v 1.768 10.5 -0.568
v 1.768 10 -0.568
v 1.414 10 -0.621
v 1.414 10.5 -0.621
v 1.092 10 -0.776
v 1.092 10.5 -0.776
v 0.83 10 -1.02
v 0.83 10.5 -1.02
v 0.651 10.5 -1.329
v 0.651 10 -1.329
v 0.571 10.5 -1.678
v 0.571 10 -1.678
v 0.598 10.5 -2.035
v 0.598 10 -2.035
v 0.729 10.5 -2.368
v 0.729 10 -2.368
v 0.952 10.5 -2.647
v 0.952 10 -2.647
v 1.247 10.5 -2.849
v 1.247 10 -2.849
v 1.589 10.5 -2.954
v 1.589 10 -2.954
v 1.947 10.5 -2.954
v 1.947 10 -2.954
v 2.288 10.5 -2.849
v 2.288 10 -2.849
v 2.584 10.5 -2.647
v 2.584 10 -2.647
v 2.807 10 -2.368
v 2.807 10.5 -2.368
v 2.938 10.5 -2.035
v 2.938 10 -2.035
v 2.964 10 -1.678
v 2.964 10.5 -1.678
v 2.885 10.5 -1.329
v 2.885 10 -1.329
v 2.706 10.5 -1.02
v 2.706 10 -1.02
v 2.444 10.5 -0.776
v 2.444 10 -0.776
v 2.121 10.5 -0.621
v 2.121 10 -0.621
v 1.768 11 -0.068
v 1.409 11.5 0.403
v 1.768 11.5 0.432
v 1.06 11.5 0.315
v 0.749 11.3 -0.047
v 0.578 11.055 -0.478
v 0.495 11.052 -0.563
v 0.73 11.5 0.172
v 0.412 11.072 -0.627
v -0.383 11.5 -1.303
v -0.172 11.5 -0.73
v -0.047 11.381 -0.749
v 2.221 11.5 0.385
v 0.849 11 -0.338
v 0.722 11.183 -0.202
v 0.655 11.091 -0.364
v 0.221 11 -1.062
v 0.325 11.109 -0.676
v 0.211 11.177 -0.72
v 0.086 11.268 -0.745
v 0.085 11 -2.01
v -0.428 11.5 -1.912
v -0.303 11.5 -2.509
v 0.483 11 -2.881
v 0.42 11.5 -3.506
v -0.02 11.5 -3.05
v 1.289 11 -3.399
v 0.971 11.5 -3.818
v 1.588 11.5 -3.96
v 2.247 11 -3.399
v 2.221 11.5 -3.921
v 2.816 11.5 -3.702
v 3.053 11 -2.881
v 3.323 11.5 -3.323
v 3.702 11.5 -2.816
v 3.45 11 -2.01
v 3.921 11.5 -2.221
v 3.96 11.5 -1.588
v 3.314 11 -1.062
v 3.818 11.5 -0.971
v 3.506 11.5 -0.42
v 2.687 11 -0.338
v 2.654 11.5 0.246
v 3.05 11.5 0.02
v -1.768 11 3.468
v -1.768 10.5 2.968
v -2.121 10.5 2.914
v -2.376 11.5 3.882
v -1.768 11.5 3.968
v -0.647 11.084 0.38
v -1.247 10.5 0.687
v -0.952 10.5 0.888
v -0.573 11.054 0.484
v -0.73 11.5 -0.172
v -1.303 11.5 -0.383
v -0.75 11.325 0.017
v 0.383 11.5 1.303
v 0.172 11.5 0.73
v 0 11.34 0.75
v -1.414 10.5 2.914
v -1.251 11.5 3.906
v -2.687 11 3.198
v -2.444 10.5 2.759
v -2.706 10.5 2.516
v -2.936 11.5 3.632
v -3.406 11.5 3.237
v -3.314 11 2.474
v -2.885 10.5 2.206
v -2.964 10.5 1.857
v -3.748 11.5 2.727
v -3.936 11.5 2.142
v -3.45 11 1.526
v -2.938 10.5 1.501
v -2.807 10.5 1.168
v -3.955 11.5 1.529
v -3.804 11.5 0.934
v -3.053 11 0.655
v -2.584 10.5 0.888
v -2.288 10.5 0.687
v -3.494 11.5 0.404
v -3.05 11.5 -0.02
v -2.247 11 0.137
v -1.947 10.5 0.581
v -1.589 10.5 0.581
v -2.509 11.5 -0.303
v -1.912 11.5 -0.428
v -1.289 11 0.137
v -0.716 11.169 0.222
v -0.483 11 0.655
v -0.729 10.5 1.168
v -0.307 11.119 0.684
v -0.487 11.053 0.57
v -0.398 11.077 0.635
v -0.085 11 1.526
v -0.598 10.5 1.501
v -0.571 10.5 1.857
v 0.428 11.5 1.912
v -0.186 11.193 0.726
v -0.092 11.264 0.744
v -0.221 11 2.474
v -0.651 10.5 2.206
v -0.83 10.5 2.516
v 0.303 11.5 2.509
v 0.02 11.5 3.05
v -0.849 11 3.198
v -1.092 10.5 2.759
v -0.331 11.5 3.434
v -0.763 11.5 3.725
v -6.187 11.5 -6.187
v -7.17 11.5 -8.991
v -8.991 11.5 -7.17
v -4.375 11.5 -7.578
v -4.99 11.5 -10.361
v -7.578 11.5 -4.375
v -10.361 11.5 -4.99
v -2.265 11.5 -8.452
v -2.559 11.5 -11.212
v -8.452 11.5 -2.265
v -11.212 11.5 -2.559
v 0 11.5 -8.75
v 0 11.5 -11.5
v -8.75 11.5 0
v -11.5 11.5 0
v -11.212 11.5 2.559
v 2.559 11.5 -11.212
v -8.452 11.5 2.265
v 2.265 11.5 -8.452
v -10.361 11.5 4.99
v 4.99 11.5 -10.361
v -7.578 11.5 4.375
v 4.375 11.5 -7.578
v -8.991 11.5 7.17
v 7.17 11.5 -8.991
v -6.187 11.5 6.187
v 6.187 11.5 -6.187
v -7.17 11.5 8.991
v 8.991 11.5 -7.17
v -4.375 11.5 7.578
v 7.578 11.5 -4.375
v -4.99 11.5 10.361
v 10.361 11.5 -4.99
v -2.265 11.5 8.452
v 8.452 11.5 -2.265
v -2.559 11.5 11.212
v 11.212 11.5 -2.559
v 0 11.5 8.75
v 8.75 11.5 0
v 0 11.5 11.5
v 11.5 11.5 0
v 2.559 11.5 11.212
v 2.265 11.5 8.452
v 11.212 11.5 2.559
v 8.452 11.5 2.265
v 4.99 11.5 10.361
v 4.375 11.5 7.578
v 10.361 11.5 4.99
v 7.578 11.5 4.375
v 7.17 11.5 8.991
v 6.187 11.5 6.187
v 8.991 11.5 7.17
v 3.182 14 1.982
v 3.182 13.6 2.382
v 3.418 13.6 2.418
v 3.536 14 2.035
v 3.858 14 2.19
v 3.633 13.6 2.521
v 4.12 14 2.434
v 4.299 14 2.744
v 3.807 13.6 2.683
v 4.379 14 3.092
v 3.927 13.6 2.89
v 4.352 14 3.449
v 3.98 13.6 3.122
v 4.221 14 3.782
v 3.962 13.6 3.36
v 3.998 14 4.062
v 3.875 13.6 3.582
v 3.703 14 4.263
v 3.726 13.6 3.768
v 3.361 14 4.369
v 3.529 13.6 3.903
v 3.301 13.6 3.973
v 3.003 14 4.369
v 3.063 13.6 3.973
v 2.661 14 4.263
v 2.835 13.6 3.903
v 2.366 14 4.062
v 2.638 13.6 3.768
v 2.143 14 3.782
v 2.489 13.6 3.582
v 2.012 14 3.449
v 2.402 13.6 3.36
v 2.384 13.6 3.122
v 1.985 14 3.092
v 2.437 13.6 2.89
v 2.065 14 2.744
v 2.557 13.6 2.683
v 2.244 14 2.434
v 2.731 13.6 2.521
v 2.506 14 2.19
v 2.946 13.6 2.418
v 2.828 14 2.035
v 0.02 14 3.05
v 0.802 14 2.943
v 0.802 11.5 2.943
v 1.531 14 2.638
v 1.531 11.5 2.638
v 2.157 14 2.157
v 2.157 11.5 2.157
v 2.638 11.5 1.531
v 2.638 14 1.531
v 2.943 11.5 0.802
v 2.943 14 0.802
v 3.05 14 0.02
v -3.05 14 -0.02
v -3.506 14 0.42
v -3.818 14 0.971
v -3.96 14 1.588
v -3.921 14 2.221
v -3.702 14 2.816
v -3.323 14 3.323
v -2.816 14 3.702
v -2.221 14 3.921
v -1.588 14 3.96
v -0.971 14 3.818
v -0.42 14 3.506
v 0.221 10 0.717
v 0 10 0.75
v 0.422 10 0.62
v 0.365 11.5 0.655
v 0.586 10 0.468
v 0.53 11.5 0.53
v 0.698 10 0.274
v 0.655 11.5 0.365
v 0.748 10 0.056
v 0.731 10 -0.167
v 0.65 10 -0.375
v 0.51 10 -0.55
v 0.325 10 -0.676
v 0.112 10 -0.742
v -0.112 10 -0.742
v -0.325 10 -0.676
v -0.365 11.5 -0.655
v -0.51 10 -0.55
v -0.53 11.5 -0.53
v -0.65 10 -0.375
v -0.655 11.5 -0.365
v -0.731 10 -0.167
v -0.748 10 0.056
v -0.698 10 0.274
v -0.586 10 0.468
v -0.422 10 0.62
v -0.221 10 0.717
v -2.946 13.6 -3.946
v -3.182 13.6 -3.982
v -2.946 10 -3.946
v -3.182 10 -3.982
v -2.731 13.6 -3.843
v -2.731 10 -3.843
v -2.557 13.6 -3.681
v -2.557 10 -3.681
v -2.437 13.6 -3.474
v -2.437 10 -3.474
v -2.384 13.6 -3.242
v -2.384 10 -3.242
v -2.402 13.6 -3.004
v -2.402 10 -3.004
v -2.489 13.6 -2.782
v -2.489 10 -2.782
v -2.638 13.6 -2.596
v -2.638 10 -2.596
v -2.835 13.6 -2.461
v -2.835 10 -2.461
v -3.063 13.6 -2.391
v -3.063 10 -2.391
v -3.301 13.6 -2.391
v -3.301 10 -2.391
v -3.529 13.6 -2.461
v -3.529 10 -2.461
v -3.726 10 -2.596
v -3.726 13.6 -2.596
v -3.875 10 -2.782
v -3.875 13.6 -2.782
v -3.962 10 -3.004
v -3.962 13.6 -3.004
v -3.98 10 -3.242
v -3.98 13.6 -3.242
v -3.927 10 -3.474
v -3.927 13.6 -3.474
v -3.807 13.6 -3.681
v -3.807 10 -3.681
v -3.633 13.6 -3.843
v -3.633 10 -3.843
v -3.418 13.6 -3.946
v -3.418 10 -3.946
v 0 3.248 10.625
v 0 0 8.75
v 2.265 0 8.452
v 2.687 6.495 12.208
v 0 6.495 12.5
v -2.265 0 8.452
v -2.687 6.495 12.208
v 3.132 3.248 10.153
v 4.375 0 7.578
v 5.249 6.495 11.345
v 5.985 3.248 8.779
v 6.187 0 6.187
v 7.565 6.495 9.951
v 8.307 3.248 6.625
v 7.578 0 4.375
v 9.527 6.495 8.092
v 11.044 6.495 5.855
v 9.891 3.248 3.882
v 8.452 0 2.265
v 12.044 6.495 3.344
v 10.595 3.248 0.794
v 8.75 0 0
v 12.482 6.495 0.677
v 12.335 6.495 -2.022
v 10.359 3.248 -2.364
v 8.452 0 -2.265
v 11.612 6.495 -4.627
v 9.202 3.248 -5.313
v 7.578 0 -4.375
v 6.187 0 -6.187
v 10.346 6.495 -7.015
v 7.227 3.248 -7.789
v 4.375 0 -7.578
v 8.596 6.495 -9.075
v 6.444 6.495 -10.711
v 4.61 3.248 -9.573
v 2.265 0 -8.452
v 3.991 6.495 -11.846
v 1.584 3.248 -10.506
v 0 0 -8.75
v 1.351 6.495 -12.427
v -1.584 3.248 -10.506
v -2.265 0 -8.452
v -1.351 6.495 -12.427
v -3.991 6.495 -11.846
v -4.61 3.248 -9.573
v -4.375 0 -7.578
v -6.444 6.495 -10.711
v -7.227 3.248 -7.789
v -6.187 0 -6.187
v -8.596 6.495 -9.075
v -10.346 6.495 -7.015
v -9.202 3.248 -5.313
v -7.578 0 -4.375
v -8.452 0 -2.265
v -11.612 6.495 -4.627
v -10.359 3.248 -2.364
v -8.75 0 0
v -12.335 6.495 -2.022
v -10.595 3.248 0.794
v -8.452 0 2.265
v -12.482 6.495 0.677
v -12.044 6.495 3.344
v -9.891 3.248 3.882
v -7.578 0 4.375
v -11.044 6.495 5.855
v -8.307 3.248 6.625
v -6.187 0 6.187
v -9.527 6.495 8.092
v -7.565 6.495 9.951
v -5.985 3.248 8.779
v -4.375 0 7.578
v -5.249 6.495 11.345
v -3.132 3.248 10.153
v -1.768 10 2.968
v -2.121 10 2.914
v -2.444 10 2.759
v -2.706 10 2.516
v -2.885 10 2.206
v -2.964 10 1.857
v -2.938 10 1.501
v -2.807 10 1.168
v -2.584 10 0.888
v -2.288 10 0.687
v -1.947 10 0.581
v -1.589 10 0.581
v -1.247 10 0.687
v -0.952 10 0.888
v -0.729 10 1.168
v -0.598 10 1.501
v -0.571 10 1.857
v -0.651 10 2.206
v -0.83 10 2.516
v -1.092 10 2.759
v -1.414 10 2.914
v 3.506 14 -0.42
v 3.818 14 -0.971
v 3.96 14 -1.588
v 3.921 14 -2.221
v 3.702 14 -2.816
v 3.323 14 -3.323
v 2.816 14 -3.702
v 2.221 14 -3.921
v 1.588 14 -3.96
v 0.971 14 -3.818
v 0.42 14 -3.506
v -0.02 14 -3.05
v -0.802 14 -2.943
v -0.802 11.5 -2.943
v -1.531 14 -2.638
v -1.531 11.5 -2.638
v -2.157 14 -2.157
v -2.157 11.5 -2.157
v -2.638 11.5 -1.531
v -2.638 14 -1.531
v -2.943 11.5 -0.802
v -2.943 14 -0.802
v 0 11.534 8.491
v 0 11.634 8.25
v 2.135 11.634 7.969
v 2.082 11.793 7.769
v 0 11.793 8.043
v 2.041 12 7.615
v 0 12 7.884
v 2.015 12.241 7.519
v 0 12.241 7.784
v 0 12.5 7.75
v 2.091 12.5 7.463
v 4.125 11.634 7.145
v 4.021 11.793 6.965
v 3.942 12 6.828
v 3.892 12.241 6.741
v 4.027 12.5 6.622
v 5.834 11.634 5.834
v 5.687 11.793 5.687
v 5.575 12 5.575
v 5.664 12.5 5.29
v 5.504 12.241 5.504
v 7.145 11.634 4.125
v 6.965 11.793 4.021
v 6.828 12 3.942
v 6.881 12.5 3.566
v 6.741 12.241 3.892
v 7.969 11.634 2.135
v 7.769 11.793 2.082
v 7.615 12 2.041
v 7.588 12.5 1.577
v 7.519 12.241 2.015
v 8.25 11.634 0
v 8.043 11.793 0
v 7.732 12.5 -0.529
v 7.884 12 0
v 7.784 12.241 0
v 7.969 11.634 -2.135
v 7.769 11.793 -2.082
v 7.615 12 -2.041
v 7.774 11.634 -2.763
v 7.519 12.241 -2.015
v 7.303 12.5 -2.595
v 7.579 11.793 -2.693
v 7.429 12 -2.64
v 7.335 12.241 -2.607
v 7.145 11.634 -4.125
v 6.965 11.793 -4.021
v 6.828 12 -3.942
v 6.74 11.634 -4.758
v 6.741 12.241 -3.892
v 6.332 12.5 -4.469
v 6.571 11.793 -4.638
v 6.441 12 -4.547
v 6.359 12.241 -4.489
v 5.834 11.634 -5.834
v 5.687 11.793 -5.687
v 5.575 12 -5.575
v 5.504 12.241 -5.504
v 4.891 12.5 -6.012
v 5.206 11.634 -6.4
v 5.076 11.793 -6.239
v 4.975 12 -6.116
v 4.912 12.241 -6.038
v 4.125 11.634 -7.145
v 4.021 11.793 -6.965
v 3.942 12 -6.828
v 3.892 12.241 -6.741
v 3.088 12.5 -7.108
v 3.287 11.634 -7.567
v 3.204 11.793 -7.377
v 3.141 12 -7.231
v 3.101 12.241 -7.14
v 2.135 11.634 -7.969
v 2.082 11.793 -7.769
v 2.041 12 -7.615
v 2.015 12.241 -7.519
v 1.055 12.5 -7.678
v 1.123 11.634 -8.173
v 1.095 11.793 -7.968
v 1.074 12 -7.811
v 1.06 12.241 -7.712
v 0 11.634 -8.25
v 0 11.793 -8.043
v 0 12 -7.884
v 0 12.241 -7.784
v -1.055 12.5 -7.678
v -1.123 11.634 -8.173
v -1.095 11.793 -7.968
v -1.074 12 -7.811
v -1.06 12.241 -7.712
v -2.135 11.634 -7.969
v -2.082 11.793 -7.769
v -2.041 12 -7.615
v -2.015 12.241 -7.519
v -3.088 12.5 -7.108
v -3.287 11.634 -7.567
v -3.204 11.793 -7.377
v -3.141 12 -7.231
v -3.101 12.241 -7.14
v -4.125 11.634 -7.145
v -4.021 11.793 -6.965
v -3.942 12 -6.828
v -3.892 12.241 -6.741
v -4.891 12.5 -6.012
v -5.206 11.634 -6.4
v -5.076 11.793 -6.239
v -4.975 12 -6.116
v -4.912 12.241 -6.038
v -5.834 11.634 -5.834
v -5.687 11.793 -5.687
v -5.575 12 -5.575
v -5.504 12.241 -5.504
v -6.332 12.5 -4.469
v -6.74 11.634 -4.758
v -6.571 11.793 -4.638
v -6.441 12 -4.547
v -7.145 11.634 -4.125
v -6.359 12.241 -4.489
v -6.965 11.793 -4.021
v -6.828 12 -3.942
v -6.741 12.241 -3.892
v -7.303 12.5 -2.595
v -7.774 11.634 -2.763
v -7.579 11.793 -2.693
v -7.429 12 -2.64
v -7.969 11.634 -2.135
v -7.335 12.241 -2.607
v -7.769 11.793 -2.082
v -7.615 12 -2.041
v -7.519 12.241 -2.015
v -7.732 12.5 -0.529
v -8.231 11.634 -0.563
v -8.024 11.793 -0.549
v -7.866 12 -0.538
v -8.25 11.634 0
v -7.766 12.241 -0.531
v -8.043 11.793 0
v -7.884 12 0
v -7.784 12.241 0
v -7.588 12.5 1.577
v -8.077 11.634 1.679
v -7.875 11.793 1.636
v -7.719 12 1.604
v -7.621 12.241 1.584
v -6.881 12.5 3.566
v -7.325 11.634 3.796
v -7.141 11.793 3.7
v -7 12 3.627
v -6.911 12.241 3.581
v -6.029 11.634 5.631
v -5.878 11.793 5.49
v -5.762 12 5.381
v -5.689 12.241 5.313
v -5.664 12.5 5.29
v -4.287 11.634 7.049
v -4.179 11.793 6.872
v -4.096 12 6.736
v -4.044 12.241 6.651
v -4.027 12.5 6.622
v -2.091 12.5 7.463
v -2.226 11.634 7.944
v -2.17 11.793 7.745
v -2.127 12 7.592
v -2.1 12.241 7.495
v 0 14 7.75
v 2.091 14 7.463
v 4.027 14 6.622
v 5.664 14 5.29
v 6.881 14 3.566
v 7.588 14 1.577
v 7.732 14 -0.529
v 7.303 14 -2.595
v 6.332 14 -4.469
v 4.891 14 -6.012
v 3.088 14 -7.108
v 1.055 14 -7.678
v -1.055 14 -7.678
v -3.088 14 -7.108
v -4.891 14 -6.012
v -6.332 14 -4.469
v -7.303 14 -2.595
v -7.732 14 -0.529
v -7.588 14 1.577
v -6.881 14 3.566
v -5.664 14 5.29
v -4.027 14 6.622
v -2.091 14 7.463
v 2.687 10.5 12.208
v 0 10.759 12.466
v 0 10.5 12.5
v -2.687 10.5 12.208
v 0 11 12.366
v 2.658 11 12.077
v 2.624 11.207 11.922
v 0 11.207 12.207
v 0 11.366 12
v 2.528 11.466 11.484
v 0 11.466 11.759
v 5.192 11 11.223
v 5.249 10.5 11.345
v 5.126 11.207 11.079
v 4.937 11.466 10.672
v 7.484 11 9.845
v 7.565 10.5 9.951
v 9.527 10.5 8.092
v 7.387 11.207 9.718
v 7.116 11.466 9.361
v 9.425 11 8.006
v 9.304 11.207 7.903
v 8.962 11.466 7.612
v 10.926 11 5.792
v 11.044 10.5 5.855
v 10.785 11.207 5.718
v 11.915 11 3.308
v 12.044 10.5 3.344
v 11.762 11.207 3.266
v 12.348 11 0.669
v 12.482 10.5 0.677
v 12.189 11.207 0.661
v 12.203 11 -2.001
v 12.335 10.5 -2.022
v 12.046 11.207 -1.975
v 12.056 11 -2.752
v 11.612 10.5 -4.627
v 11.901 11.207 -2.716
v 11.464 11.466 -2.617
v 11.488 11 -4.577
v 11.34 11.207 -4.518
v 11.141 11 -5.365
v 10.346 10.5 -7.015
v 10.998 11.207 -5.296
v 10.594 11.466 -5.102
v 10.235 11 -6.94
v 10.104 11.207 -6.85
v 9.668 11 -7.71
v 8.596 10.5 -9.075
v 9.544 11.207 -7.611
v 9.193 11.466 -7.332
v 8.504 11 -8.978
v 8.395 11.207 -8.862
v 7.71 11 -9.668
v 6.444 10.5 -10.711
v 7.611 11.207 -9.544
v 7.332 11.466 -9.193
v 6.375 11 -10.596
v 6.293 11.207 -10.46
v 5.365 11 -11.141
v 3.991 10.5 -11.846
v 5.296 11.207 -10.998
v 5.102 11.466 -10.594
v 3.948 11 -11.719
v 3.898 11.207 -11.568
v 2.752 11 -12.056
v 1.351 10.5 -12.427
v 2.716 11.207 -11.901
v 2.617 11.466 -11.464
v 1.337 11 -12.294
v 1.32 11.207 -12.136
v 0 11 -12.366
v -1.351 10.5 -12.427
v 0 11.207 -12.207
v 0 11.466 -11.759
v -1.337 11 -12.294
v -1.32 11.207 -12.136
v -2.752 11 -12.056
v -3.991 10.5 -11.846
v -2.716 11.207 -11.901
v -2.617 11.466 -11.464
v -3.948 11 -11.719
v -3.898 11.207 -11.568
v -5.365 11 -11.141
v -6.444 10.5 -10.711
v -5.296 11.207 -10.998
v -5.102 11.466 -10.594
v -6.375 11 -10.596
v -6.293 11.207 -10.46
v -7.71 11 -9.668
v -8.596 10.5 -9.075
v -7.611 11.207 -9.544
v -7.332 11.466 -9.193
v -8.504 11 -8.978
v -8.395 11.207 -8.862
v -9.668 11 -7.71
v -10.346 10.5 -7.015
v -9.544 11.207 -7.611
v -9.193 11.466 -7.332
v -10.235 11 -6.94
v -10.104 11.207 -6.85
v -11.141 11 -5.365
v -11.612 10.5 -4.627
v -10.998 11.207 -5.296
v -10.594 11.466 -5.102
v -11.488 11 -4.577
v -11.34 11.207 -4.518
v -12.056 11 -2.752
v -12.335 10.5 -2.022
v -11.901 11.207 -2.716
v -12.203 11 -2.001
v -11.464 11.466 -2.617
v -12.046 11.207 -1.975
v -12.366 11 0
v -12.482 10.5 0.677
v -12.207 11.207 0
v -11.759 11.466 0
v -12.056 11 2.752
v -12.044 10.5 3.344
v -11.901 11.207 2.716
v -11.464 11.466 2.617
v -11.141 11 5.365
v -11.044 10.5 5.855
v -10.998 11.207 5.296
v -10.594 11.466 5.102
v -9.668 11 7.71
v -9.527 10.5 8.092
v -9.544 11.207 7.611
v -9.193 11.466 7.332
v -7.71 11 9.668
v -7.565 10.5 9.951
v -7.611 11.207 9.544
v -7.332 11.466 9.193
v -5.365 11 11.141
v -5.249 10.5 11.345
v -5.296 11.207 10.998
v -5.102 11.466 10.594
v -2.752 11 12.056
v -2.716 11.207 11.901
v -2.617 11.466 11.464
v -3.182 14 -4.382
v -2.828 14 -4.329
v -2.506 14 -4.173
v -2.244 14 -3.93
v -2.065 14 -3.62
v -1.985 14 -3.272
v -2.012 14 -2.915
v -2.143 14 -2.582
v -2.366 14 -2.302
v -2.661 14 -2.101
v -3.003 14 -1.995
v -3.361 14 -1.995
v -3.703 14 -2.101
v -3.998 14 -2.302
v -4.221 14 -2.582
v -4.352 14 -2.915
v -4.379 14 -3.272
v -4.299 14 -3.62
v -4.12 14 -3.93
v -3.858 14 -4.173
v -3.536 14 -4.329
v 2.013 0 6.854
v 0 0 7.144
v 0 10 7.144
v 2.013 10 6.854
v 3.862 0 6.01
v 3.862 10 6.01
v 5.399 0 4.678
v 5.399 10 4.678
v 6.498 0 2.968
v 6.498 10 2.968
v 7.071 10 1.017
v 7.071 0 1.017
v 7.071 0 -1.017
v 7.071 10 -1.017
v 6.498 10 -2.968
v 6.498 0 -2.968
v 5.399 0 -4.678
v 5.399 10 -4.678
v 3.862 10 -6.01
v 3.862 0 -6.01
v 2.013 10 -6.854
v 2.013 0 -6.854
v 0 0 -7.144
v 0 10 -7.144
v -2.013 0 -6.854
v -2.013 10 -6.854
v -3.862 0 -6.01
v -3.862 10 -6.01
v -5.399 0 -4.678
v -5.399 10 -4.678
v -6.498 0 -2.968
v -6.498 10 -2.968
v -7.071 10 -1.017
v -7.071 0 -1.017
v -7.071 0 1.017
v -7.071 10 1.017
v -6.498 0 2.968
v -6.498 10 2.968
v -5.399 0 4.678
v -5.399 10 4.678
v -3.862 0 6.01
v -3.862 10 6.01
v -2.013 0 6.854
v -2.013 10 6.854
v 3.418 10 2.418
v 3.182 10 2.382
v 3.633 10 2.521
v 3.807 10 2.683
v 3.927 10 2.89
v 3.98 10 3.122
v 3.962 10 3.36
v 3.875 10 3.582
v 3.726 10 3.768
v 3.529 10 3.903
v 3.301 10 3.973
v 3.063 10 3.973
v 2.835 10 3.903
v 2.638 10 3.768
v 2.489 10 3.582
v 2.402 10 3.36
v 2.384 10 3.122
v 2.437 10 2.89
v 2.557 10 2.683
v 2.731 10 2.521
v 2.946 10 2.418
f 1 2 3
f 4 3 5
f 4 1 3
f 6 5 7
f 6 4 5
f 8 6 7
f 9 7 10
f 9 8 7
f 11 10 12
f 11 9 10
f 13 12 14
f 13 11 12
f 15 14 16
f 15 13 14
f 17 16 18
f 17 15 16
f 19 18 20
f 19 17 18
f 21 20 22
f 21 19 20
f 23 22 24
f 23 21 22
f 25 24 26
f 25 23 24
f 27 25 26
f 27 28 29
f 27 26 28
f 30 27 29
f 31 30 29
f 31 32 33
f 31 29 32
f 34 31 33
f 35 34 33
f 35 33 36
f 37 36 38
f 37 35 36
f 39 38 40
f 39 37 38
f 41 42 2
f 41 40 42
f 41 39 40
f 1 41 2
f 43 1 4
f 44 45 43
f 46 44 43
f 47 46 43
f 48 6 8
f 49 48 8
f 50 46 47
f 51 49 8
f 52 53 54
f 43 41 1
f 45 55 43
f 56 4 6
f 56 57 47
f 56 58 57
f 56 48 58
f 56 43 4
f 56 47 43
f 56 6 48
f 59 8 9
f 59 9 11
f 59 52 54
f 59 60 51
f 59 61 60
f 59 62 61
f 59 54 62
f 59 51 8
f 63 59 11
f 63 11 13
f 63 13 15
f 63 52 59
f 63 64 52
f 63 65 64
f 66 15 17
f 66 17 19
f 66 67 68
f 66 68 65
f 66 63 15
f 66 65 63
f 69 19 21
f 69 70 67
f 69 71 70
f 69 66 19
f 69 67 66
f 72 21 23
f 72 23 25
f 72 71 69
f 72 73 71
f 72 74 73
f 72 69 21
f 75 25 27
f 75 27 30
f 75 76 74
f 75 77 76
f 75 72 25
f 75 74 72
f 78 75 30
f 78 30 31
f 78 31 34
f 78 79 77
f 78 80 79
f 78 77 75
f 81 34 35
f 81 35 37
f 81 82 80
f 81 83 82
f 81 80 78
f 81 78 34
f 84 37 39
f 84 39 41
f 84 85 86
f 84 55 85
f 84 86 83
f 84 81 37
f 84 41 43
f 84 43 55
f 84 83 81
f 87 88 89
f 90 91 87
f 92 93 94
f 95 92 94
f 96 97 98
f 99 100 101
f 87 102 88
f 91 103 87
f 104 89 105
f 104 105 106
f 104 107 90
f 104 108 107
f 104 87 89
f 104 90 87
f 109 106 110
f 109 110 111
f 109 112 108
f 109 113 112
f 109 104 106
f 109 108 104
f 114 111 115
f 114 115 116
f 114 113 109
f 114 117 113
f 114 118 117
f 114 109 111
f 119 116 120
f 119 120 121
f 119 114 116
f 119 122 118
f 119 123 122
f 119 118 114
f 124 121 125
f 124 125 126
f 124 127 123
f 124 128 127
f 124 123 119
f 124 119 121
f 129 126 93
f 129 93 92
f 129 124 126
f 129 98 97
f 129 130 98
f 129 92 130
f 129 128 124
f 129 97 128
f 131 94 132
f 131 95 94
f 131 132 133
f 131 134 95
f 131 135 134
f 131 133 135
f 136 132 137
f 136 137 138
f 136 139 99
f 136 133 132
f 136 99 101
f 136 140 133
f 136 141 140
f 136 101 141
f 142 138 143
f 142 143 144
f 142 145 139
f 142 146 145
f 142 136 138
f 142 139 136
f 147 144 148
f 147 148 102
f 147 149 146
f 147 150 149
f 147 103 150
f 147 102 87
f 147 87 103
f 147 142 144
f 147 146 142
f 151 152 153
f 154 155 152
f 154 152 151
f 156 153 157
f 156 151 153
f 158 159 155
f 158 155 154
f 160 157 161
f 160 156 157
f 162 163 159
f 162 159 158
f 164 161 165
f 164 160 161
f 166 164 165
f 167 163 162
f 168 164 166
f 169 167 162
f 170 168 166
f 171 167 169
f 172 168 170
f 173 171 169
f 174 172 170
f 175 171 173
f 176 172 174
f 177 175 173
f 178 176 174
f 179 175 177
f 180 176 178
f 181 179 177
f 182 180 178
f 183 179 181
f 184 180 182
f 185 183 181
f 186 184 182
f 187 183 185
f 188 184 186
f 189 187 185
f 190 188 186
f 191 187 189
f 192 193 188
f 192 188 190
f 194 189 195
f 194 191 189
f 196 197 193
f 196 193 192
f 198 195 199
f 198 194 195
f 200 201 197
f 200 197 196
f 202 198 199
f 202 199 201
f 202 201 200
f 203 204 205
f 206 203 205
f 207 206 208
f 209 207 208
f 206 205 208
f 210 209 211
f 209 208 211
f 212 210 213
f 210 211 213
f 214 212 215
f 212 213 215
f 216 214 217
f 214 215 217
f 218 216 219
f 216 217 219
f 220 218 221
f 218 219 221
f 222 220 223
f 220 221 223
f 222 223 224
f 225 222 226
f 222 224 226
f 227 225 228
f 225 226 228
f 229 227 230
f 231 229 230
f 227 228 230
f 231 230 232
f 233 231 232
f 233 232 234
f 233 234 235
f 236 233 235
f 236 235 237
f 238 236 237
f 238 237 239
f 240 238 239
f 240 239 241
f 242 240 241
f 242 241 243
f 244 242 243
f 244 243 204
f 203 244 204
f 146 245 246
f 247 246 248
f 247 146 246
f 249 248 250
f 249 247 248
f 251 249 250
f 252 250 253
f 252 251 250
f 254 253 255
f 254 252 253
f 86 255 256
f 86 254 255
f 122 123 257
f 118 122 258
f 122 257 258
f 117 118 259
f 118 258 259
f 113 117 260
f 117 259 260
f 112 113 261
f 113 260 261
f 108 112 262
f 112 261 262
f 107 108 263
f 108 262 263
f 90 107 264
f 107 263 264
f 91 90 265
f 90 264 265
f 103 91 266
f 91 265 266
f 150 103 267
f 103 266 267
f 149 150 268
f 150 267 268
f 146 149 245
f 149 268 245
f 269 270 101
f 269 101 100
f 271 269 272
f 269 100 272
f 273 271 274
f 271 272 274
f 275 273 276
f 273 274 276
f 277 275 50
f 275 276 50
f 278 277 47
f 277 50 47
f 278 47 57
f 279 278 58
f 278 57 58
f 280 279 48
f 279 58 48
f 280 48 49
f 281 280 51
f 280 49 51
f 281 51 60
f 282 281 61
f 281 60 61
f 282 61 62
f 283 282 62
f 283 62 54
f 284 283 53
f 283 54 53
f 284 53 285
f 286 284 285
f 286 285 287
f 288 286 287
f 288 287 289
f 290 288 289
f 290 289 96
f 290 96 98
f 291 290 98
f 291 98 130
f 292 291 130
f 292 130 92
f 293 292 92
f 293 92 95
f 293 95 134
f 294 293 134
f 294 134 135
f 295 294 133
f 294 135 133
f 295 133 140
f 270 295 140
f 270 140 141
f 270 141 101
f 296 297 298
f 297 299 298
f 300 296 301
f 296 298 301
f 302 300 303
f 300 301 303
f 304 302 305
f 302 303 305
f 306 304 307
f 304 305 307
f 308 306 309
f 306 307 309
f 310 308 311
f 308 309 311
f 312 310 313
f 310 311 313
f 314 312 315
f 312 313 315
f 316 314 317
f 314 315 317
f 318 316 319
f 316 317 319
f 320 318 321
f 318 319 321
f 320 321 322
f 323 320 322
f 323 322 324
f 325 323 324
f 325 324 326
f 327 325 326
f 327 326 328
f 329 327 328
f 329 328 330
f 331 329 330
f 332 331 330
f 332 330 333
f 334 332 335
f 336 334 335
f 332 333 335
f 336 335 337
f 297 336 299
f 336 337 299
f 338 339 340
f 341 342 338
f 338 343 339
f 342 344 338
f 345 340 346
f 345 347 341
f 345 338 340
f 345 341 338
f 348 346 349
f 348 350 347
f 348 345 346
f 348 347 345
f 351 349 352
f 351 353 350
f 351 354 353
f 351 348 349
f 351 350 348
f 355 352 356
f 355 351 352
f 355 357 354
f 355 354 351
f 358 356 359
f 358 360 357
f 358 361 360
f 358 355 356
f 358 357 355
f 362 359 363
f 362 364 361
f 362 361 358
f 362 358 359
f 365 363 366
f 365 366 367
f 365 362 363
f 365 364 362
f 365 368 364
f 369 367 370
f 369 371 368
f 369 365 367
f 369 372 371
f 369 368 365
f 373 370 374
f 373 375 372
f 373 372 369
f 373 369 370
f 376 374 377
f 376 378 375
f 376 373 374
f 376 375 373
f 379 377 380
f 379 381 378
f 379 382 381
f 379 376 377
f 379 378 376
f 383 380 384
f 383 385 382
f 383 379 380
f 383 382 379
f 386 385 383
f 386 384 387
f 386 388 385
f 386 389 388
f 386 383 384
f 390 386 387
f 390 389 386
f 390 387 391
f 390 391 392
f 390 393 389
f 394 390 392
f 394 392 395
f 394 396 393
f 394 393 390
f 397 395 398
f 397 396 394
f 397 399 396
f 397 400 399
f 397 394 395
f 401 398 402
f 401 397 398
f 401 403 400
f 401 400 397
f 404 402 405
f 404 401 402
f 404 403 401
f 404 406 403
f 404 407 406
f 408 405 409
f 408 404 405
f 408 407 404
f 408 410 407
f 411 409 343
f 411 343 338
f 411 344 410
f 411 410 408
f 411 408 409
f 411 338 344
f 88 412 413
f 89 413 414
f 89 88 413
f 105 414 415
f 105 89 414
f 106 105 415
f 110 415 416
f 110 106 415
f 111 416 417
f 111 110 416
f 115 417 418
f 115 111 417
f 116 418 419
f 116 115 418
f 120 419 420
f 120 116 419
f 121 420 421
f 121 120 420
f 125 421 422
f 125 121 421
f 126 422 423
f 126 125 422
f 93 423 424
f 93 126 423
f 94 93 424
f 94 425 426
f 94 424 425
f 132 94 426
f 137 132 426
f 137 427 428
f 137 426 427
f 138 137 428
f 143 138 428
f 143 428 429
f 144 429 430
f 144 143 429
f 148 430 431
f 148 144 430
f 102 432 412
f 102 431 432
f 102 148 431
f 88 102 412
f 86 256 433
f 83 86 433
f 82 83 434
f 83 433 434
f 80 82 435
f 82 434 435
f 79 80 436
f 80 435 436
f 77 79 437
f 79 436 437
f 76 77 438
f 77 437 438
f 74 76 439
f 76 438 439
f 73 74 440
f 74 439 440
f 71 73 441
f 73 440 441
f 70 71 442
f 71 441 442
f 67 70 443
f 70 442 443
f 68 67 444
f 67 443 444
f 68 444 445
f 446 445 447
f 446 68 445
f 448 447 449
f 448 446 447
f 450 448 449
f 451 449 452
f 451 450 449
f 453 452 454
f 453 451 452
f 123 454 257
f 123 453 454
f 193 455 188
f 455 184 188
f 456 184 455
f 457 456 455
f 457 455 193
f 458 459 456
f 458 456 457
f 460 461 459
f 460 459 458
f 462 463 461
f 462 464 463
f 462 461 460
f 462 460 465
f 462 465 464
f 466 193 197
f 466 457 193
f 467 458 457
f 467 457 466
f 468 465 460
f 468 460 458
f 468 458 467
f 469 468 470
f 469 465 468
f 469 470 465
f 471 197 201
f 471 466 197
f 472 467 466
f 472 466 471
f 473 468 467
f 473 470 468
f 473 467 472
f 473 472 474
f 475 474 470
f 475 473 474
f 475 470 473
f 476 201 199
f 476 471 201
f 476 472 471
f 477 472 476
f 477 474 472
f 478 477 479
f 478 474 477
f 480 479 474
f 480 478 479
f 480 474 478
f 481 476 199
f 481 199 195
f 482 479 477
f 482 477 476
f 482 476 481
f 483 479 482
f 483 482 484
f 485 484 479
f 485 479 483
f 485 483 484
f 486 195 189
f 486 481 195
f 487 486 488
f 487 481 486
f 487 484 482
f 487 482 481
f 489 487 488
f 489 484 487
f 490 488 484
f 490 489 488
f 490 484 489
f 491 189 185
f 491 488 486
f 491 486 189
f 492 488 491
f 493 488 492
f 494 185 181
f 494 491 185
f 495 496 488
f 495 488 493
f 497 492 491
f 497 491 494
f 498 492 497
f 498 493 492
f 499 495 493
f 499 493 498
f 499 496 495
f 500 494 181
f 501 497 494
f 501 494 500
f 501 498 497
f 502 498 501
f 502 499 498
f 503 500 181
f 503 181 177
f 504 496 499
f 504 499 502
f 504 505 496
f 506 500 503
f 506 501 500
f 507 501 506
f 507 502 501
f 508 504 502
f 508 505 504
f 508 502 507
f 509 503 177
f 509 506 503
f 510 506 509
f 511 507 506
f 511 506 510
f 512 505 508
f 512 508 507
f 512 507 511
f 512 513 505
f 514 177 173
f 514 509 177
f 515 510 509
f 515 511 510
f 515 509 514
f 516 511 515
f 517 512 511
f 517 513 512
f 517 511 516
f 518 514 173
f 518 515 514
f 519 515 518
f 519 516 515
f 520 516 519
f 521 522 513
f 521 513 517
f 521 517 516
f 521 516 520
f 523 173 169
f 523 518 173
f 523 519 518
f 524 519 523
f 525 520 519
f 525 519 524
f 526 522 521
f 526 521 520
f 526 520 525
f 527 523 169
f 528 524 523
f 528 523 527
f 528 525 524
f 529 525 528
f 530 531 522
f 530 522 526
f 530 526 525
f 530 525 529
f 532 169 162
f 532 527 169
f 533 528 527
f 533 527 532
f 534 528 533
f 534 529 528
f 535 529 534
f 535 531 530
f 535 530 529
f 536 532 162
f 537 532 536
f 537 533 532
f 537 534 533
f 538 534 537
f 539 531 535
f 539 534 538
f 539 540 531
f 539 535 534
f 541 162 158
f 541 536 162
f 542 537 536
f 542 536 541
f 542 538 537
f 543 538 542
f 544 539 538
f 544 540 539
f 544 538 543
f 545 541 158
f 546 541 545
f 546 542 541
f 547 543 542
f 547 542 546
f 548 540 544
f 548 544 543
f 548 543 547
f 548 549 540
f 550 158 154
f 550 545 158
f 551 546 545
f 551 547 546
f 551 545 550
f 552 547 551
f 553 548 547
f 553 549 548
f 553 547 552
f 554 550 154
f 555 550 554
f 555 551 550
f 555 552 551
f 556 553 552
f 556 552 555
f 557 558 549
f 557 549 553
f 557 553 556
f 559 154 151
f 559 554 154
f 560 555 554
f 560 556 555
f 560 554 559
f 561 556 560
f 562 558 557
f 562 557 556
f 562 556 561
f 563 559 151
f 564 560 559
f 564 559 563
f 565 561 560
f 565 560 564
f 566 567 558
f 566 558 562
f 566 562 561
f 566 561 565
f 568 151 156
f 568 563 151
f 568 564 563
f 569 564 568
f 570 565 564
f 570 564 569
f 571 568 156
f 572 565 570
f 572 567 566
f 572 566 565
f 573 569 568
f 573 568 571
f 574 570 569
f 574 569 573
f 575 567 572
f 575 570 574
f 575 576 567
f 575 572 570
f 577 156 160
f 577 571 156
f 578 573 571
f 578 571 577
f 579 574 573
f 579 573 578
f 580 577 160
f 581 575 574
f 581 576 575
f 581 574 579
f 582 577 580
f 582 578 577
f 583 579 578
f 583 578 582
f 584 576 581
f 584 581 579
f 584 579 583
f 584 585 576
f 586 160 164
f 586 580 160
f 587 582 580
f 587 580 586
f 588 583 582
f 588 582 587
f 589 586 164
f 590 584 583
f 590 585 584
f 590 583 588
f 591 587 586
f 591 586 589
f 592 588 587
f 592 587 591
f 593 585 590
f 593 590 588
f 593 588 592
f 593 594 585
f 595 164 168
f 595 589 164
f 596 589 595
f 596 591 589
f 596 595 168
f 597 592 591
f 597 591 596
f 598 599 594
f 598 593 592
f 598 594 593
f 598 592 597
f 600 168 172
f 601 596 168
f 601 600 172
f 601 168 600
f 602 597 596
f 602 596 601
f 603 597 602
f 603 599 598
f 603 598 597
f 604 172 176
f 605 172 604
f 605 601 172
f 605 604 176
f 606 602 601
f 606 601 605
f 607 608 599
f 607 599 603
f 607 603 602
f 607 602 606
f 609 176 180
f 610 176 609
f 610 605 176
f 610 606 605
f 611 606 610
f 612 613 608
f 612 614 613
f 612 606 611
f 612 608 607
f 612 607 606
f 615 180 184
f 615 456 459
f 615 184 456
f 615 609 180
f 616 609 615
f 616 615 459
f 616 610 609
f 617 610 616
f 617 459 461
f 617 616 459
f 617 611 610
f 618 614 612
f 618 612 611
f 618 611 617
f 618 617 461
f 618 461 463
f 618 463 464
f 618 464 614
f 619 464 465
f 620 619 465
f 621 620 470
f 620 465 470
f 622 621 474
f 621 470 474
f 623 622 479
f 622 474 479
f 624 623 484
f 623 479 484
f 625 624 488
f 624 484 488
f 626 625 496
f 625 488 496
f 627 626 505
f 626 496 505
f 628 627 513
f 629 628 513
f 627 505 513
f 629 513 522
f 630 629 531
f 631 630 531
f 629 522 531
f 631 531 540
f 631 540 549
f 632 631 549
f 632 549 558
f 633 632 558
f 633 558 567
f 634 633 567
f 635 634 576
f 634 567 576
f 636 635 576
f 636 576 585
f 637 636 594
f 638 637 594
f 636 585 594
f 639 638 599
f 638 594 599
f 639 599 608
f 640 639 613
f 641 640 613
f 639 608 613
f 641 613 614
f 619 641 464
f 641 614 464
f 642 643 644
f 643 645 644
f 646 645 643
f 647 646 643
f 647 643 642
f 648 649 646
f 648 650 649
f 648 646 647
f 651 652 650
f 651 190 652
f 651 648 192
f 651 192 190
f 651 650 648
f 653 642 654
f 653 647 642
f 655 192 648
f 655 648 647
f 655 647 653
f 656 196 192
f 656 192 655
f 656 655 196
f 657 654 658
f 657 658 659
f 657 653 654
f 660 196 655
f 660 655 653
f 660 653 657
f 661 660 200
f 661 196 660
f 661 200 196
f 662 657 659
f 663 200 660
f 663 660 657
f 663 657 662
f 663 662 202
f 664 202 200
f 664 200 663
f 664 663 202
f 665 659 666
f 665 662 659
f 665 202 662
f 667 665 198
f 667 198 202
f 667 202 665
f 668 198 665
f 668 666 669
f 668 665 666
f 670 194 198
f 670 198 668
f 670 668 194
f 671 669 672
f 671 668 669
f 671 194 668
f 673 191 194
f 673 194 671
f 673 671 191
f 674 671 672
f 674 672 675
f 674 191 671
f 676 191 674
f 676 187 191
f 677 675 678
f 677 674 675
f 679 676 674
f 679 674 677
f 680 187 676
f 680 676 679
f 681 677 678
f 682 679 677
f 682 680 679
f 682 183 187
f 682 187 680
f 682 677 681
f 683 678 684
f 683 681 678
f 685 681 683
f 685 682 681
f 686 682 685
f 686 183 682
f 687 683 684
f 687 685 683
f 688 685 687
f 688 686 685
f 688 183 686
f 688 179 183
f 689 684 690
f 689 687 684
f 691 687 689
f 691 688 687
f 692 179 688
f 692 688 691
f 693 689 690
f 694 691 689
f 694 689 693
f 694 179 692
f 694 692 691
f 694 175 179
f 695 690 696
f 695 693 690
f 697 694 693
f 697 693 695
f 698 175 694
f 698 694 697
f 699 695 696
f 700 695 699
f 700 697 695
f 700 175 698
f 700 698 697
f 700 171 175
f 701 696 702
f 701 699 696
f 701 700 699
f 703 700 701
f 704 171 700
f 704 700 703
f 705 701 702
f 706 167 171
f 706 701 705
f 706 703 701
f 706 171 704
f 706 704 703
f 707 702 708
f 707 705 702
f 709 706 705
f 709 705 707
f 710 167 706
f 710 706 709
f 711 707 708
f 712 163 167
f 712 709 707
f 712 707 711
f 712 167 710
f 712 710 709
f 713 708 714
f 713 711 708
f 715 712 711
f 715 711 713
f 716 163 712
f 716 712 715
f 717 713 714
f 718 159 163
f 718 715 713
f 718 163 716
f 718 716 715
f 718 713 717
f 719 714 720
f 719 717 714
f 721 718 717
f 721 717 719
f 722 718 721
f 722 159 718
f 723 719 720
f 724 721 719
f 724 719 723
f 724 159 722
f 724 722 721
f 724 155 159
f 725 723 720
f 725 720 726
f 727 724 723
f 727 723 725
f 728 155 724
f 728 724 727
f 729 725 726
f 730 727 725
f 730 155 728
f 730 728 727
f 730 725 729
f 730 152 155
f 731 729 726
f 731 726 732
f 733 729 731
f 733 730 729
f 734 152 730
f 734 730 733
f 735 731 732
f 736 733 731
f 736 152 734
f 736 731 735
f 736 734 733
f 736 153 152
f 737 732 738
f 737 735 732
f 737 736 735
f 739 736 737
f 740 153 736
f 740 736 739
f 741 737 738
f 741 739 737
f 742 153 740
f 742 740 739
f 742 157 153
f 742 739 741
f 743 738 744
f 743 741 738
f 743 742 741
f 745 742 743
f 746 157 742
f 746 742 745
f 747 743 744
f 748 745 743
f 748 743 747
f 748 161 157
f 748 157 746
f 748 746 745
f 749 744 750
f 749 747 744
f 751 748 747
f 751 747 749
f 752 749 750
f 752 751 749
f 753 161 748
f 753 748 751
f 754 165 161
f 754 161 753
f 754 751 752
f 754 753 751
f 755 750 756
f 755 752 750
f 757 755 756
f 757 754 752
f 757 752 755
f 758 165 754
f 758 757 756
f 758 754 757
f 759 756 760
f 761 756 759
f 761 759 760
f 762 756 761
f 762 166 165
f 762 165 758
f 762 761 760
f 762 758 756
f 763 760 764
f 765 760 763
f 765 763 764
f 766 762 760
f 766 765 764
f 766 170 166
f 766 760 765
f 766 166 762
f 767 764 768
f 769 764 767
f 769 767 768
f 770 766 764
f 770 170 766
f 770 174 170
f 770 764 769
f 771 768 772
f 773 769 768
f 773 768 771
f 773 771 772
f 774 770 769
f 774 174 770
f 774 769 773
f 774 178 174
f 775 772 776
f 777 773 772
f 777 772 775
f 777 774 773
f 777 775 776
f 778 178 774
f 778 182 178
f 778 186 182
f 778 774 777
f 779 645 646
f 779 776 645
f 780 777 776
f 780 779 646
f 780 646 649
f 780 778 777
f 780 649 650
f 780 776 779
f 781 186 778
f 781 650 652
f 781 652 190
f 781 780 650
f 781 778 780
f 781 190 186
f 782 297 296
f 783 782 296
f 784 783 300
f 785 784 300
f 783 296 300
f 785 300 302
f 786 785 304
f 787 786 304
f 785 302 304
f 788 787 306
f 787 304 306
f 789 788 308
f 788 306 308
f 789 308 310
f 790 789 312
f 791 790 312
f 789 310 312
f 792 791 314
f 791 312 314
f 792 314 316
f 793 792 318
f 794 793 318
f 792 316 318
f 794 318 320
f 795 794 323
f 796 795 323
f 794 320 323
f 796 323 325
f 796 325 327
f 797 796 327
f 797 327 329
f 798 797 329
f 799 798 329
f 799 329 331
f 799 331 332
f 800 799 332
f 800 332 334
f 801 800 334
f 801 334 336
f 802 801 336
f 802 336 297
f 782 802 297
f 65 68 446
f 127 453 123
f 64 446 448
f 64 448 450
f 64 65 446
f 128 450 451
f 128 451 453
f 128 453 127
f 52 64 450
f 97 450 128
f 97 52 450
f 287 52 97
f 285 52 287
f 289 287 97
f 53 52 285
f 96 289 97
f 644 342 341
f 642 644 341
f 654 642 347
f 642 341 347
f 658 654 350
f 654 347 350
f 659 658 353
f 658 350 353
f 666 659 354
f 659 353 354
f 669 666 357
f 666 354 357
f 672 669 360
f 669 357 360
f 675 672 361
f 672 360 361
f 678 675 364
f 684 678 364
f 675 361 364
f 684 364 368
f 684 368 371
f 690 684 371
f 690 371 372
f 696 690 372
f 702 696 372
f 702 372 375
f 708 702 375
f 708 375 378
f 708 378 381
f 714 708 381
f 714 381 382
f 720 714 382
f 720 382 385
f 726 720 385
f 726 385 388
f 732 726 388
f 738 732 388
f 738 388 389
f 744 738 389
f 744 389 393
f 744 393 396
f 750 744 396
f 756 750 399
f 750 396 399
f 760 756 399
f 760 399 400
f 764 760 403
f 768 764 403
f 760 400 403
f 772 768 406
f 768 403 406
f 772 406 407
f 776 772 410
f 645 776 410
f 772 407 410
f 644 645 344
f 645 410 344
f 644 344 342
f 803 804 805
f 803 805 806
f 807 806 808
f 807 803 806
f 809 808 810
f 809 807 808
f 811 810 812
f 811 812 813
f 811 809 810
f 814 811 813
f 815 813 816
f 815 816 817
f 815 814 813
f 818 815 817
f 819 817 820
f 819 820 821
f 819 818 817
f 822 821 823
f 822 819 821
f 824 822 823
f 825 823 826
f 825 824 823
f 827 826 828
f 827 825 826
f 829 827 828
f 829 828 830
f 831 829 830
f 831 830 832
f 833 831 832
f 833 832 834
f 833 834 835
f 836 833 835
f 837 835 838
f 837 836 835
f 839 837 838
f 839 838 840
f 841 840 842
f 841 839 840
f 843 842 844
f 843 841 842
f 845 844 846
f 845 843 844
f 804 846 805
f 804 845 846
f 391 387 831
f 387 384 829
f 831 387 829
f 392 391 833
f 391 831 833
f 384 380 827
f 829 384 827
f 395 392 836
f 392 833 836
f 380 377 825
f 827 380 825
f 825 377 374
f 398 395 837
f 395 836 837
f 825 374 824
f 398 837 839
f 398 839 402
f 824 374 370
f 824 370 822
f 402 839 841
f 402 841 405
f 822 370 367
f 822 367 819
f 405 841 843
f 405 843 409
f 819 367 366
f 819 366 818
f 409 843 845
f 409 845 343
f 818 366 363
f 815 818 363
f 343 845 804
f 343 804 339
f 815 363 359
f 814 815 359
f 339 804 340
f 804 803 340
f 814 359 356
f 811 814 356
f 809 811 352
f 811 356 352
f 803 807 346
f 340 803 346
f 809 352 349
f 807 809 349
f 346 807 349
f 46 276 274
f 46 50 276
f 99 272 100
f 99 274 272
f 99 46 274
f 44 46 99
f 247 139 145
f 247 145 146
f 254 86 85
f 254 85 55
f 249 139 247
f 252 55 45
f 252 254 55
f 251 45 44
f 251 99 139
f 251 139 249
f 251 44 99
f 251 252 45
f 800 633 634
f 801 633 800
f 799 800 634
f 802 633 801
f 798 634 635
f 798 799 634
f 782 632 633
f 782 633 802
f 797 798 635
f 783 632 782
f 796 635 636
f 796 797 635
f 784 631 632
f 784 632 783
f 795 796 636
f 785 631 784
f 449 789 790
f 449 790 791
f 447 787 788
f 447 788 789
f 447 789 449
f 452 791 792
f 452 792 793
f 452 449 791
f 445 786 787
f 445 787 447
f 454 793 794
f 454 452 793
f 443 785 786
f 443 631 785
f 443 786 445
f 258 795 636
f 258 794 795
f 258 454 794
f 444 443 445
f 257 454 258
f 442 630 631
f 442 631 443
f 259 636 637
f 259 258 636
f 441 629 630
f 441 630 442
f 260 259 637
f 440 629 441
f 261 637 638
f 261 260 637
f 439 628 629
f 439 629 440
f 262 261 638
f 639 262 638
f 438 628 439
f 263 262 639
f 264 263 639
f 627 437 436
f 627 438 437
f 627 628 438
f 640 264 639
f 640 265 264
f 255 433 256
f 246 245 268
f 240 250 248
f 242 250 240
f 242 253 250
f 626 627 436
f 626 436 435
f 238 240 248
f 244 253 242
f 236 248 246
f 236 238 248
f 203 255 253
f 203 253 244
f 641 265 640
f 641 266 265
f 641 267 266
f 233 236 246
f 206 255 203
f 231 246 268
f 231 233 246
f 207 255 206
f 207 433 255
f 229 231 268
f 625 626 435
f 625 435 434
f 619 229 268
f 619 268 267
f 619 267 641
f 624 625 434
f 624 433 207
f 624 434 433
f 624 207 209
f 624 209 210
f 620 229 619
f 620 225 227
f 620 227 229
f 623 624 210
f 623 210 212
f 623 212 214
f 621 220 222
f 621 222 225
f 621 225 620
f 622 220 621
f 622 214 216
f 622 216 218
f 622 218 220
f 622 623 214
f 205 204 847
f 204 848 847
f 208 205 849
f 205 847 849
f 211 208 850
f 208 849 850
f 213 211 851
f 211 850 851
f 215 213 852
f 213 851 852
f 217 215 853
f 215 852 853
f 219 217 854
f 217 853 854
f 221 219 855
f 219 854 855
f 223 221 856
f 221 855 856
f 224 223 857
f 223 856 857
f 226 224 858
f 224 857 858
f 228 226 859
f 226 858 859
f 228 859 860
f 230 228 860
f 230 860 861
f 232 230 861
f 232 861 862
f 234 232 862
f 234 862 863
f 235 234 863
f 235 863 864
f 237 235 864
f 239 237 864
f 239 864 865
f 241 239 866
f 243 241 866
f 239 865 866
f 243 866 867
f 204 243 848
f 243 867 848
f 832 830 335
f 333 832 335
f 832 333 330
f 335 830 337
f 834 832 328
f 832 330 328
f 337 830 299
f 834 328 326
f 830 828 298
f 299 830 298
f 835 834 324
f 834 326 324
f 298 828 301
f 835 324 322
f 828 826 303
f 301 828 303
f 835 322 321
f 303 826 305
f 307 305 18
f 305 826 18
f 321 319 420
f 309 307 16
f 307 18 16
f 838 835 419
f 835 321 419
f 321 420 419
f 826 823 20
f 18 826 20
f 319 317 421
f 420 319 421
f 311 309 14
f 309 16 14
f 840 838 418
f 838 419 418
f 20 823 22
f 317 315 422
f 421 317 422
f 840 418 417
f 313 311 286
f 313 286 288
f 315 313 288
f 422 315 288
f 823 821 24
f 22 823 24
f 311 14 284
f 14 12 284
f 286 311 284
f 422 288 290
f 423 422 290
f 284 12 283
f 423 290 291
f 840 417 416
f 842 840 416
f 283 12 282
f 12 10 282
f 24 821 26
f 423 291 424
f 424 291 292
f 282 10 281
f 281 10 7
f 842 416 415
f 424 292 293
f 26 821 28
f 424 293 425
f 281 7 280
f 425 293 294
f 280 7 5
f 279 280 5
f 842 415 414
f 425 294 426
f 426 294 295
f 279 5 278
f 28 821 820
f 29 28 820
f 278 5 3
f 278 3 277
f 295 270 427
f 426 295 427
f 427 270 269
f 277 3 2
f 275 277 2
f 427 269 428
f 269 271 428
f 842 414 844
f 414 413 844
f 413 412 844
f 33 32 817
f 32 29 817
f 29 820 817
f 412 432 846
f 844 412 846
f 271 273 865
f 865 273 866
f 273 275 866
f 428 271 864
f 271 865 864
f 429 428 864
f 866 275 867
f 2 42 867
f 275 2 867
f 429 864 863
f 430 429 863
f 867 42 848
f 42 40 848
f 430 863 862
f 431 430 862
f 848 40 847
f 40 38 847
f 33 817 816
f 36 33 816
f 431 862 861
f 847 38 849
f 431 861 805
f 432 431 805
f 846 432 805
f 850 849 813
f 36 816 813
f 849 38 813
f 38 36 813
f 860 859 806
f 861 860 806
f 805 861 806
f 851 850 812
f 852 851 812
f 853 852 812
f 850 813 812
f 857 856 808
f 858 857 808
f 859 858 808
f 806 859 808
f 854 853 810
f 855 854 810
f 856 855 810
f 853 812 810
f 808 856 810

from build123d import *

# Parameters (mm, degrees)
SKETCH1_R                                      = 12.5
SKETCH1_R_2                                    = 7.14375
BOSS_EXTRUDE1_DEPTH                            = 10
SKETCH2_R                                      = 12.5
BOSS_EXTRUDE2_DEPTH                            = 1.5
CHAMFER1_SIZE                                  = 3.75
CHAMFER1_SIZE2                                 = 6.495190528
SKETCH8_R                                      = 7.75
SKETCH8_R_2                                    = 3.05
BOSS_EXTRUDE3_DEPTH                            = 2.5
CSK_FOR_M2_FLAT_HEAD_MACHINE_SCREW1_AT_2_COUNT = 2
CSK_FOR_M2_FLAT_HEAD_MACHINE_SCREW1_AT_2_PITCH = 5
SKETCH16_R                                     = 0.75
CUT_EXTRUDE1_DEPTH                             = 22.089096709
M2X0_4_TAPPED_HOLE1_D                          = 1.6
M2X0_4_TAPPED_HOLE1_CSINK_D                    = 2.4
M2X0_4_TAPPED_HOLE1_CSINK_ANGLE                = 90
CUT_EXTRUDE2_DEPTH                             = 2.5
FILLET1_R                                      = 1


with BuildPart() as part:
    # Sketch1 → Boss-Extrude1 (new body)
    with BuildSketch(Plane(origin=(0, 0, 0), x_dir=(1, 0, 0), z_dir=(0, 1, 0))):
        with Locations(Location((0, 0, 0), (0, 0, 270))):
            Circle(SKETCH1_R)
        with Locations(Location((0, 0, 0), (0, 0, 270))):
            Circle(SKETCH1_R_2, mode=Mode.SUBTRACT)
    extrude(amount=BOSS_EXTRUDE1_DEPTH)

    # Sketch2 → Boss-Extrude2 (add)
    with BuildSketch(Plane(origin=(0, 10, 0), x_dir=(1, 0, 0), z_dir=(0, 1, 0))):
        with Locations(Location((0, 0, 0), (0, 0, 270))):
            Circle(SKETCH2_R)
    extrude(amount=BOSS_EXTRUDE2_DEPTH)

    # Chamfer1
    chamfer1_edges = [part.edges().sort_by_distance(p)[0] for p in [
        (0, 0, -12.5),
    ]]
    chamfer1_side = [part.faces().sort_by_distance(p)[0] for p in [
        (0, 0, -12.146446609),
    ]]
    chamfer(chamfer1_edges, length=CHAMFER1_SIZE, length2=CHAMFER1_SIZE2, reference=chamfer1_side[0])

    # Sketch8 → Boss-Extrude3 (add)
    with BuildSketch(Plane(origin=(0, 11.5, 0), x_dir=(1, 0, 0), z_dir=(0, 1, 0))):
        with Locations(Location((0, 0, 0), (0, 0, 270))):
            Circle(SKETCH8_R)
        with Locations(Location((0, 0, 0), (0, 0, 270))):
            Circle(SKETCH8_R_2, mode=Mode.SUBTRACT)
    extrude(amount=BOSS_EXTRUDE3_DEPTH)

    # Sketch11 → CSK for M2 Flat Head Machine Screw1 (revolve, cut)
    with BuildSketch(Plane(origin=(-1.767766953, 11.5, 1.767766953), x_dir=(0, 0, 1), z_dir=(1, 0, 0))):
        Polygon((0, 0), (0, 11.5), (1.2, 11.5), (1.2, 1), (2.2, 0), align=None)
    csk_for_m2_flat_head_machine_screw1 = revolve(axis=Axis((-1.767766953, 17.85, 1.767766953), (0, -1, 0)), mode=Mode.SUBTRACT)

    # CSK for M2 Flat Head Machine Screw1 at 2: CSK for M2 Flat Head Machine Screw1 ×2
    with Locations(*[Vector(0.707106781186547, 0, -0.707106781186548) * (i * CSK_FOR_M2_FLAT_HEAD_MACHINE_SCREW1_AT_2_PITCH) for i in range(1, CSK_FOR_M2_FLAT_HEAD_MACHINE_SCREW1_AT_2_COUNT)]):
        add(csk_for_m2_flat_head_machine_screw1, mode=Mode.SUBTRACT)

    # Sketch16 → Cut-Extrude1 (cut, through all)
    with BuildSketch(Plane(origin=(0, 11.5, 0), x_dir=(1, 0, 0), z_dir=(0, 1, 0))):
        with Locations(Location((0, 0, 0), (0, 0, 270))):
            Circle(SKETCH16_R)
    extrude(amount=-CUT_EXTRUDE1_DEPTH, mode=Mode.SUBTRACT)

    # M2x0.4 Tapped Hole1 (through all)
    with Locations(Plane(origin=(3.181980515, 14, 3.181980515), x_dir=(0, 0, 1), z_dir=(0, 1, 0))):
        with Locations((0, 0), (-6.36396103, -6.36396103)):
            CounterSinkHole(M2X0_4_TAPPED_HOLE1_D / 2, M2X0_4_TAPPED_HOLE1_CSINK_D / 2, counter_sink_angle=M2X0_4_TAPPED_HOLE1_CSINK_ANGLE)

    # Sketch20 → Cut-Extrude2 (cut)
    with BuildSketch(Plane(origin=(0, 14, 0), x_dir=(1, 0, 0), z_dir=(0, 1, 0))):
        with BuildLine():
            ThreePointArc((0.019981986, -3.049934544), (0.42751991, -1.911696068), (0.172083929, -0.729991179))
            ThreePointArc((0.172083929, -0.729991179), (-0.530330086, -0.530330086), (-0.729991179, 0.172083929))
            ThreePointArc((-0.729991179, 0.172083929), (-1.911696068, 0.42751991), (-3.049934544, 0.019981986))
            ThreePointArc((-3.049934544, 0.019981986), (-3.323401872, -3.323401872), (0.019981986, -3.049934544))
        make_face()
        with BuildLine():
            ThreePointArc((-0.019981986, 3.049934544), (-0.42751991, 1.911696068), (-0.172083929, 0.729991179))
            ThreePointArc((-0.172083929, 0.729991179), (0.530330086, 0.530330086), (0.729991179, -0.172083929))
            ThreePointArc((0.729991179, -0.172083929), (1.911696068, -0.42751991), (3.049934544, -0.019981986))
            ThreePointArc((3.049934544, -0.019981986), (3.323401872, 3.323401872), (-0.019981986, 3.049934544))
        make_face()
    extrude(amount=-CUT_EXTRUDE2_DEPTH, mode=Mode.SUBTRACT)

    # Fillet1
    fillet1_edges = [part.edges().sort_by_distance(p)[0] for p in [
        (0, 11.5, -12.5),
        (0, 11.5, -7.75),
    ]]
    fillet(fillet1_edges, radius=FILLET1_R)


solid = part.part
